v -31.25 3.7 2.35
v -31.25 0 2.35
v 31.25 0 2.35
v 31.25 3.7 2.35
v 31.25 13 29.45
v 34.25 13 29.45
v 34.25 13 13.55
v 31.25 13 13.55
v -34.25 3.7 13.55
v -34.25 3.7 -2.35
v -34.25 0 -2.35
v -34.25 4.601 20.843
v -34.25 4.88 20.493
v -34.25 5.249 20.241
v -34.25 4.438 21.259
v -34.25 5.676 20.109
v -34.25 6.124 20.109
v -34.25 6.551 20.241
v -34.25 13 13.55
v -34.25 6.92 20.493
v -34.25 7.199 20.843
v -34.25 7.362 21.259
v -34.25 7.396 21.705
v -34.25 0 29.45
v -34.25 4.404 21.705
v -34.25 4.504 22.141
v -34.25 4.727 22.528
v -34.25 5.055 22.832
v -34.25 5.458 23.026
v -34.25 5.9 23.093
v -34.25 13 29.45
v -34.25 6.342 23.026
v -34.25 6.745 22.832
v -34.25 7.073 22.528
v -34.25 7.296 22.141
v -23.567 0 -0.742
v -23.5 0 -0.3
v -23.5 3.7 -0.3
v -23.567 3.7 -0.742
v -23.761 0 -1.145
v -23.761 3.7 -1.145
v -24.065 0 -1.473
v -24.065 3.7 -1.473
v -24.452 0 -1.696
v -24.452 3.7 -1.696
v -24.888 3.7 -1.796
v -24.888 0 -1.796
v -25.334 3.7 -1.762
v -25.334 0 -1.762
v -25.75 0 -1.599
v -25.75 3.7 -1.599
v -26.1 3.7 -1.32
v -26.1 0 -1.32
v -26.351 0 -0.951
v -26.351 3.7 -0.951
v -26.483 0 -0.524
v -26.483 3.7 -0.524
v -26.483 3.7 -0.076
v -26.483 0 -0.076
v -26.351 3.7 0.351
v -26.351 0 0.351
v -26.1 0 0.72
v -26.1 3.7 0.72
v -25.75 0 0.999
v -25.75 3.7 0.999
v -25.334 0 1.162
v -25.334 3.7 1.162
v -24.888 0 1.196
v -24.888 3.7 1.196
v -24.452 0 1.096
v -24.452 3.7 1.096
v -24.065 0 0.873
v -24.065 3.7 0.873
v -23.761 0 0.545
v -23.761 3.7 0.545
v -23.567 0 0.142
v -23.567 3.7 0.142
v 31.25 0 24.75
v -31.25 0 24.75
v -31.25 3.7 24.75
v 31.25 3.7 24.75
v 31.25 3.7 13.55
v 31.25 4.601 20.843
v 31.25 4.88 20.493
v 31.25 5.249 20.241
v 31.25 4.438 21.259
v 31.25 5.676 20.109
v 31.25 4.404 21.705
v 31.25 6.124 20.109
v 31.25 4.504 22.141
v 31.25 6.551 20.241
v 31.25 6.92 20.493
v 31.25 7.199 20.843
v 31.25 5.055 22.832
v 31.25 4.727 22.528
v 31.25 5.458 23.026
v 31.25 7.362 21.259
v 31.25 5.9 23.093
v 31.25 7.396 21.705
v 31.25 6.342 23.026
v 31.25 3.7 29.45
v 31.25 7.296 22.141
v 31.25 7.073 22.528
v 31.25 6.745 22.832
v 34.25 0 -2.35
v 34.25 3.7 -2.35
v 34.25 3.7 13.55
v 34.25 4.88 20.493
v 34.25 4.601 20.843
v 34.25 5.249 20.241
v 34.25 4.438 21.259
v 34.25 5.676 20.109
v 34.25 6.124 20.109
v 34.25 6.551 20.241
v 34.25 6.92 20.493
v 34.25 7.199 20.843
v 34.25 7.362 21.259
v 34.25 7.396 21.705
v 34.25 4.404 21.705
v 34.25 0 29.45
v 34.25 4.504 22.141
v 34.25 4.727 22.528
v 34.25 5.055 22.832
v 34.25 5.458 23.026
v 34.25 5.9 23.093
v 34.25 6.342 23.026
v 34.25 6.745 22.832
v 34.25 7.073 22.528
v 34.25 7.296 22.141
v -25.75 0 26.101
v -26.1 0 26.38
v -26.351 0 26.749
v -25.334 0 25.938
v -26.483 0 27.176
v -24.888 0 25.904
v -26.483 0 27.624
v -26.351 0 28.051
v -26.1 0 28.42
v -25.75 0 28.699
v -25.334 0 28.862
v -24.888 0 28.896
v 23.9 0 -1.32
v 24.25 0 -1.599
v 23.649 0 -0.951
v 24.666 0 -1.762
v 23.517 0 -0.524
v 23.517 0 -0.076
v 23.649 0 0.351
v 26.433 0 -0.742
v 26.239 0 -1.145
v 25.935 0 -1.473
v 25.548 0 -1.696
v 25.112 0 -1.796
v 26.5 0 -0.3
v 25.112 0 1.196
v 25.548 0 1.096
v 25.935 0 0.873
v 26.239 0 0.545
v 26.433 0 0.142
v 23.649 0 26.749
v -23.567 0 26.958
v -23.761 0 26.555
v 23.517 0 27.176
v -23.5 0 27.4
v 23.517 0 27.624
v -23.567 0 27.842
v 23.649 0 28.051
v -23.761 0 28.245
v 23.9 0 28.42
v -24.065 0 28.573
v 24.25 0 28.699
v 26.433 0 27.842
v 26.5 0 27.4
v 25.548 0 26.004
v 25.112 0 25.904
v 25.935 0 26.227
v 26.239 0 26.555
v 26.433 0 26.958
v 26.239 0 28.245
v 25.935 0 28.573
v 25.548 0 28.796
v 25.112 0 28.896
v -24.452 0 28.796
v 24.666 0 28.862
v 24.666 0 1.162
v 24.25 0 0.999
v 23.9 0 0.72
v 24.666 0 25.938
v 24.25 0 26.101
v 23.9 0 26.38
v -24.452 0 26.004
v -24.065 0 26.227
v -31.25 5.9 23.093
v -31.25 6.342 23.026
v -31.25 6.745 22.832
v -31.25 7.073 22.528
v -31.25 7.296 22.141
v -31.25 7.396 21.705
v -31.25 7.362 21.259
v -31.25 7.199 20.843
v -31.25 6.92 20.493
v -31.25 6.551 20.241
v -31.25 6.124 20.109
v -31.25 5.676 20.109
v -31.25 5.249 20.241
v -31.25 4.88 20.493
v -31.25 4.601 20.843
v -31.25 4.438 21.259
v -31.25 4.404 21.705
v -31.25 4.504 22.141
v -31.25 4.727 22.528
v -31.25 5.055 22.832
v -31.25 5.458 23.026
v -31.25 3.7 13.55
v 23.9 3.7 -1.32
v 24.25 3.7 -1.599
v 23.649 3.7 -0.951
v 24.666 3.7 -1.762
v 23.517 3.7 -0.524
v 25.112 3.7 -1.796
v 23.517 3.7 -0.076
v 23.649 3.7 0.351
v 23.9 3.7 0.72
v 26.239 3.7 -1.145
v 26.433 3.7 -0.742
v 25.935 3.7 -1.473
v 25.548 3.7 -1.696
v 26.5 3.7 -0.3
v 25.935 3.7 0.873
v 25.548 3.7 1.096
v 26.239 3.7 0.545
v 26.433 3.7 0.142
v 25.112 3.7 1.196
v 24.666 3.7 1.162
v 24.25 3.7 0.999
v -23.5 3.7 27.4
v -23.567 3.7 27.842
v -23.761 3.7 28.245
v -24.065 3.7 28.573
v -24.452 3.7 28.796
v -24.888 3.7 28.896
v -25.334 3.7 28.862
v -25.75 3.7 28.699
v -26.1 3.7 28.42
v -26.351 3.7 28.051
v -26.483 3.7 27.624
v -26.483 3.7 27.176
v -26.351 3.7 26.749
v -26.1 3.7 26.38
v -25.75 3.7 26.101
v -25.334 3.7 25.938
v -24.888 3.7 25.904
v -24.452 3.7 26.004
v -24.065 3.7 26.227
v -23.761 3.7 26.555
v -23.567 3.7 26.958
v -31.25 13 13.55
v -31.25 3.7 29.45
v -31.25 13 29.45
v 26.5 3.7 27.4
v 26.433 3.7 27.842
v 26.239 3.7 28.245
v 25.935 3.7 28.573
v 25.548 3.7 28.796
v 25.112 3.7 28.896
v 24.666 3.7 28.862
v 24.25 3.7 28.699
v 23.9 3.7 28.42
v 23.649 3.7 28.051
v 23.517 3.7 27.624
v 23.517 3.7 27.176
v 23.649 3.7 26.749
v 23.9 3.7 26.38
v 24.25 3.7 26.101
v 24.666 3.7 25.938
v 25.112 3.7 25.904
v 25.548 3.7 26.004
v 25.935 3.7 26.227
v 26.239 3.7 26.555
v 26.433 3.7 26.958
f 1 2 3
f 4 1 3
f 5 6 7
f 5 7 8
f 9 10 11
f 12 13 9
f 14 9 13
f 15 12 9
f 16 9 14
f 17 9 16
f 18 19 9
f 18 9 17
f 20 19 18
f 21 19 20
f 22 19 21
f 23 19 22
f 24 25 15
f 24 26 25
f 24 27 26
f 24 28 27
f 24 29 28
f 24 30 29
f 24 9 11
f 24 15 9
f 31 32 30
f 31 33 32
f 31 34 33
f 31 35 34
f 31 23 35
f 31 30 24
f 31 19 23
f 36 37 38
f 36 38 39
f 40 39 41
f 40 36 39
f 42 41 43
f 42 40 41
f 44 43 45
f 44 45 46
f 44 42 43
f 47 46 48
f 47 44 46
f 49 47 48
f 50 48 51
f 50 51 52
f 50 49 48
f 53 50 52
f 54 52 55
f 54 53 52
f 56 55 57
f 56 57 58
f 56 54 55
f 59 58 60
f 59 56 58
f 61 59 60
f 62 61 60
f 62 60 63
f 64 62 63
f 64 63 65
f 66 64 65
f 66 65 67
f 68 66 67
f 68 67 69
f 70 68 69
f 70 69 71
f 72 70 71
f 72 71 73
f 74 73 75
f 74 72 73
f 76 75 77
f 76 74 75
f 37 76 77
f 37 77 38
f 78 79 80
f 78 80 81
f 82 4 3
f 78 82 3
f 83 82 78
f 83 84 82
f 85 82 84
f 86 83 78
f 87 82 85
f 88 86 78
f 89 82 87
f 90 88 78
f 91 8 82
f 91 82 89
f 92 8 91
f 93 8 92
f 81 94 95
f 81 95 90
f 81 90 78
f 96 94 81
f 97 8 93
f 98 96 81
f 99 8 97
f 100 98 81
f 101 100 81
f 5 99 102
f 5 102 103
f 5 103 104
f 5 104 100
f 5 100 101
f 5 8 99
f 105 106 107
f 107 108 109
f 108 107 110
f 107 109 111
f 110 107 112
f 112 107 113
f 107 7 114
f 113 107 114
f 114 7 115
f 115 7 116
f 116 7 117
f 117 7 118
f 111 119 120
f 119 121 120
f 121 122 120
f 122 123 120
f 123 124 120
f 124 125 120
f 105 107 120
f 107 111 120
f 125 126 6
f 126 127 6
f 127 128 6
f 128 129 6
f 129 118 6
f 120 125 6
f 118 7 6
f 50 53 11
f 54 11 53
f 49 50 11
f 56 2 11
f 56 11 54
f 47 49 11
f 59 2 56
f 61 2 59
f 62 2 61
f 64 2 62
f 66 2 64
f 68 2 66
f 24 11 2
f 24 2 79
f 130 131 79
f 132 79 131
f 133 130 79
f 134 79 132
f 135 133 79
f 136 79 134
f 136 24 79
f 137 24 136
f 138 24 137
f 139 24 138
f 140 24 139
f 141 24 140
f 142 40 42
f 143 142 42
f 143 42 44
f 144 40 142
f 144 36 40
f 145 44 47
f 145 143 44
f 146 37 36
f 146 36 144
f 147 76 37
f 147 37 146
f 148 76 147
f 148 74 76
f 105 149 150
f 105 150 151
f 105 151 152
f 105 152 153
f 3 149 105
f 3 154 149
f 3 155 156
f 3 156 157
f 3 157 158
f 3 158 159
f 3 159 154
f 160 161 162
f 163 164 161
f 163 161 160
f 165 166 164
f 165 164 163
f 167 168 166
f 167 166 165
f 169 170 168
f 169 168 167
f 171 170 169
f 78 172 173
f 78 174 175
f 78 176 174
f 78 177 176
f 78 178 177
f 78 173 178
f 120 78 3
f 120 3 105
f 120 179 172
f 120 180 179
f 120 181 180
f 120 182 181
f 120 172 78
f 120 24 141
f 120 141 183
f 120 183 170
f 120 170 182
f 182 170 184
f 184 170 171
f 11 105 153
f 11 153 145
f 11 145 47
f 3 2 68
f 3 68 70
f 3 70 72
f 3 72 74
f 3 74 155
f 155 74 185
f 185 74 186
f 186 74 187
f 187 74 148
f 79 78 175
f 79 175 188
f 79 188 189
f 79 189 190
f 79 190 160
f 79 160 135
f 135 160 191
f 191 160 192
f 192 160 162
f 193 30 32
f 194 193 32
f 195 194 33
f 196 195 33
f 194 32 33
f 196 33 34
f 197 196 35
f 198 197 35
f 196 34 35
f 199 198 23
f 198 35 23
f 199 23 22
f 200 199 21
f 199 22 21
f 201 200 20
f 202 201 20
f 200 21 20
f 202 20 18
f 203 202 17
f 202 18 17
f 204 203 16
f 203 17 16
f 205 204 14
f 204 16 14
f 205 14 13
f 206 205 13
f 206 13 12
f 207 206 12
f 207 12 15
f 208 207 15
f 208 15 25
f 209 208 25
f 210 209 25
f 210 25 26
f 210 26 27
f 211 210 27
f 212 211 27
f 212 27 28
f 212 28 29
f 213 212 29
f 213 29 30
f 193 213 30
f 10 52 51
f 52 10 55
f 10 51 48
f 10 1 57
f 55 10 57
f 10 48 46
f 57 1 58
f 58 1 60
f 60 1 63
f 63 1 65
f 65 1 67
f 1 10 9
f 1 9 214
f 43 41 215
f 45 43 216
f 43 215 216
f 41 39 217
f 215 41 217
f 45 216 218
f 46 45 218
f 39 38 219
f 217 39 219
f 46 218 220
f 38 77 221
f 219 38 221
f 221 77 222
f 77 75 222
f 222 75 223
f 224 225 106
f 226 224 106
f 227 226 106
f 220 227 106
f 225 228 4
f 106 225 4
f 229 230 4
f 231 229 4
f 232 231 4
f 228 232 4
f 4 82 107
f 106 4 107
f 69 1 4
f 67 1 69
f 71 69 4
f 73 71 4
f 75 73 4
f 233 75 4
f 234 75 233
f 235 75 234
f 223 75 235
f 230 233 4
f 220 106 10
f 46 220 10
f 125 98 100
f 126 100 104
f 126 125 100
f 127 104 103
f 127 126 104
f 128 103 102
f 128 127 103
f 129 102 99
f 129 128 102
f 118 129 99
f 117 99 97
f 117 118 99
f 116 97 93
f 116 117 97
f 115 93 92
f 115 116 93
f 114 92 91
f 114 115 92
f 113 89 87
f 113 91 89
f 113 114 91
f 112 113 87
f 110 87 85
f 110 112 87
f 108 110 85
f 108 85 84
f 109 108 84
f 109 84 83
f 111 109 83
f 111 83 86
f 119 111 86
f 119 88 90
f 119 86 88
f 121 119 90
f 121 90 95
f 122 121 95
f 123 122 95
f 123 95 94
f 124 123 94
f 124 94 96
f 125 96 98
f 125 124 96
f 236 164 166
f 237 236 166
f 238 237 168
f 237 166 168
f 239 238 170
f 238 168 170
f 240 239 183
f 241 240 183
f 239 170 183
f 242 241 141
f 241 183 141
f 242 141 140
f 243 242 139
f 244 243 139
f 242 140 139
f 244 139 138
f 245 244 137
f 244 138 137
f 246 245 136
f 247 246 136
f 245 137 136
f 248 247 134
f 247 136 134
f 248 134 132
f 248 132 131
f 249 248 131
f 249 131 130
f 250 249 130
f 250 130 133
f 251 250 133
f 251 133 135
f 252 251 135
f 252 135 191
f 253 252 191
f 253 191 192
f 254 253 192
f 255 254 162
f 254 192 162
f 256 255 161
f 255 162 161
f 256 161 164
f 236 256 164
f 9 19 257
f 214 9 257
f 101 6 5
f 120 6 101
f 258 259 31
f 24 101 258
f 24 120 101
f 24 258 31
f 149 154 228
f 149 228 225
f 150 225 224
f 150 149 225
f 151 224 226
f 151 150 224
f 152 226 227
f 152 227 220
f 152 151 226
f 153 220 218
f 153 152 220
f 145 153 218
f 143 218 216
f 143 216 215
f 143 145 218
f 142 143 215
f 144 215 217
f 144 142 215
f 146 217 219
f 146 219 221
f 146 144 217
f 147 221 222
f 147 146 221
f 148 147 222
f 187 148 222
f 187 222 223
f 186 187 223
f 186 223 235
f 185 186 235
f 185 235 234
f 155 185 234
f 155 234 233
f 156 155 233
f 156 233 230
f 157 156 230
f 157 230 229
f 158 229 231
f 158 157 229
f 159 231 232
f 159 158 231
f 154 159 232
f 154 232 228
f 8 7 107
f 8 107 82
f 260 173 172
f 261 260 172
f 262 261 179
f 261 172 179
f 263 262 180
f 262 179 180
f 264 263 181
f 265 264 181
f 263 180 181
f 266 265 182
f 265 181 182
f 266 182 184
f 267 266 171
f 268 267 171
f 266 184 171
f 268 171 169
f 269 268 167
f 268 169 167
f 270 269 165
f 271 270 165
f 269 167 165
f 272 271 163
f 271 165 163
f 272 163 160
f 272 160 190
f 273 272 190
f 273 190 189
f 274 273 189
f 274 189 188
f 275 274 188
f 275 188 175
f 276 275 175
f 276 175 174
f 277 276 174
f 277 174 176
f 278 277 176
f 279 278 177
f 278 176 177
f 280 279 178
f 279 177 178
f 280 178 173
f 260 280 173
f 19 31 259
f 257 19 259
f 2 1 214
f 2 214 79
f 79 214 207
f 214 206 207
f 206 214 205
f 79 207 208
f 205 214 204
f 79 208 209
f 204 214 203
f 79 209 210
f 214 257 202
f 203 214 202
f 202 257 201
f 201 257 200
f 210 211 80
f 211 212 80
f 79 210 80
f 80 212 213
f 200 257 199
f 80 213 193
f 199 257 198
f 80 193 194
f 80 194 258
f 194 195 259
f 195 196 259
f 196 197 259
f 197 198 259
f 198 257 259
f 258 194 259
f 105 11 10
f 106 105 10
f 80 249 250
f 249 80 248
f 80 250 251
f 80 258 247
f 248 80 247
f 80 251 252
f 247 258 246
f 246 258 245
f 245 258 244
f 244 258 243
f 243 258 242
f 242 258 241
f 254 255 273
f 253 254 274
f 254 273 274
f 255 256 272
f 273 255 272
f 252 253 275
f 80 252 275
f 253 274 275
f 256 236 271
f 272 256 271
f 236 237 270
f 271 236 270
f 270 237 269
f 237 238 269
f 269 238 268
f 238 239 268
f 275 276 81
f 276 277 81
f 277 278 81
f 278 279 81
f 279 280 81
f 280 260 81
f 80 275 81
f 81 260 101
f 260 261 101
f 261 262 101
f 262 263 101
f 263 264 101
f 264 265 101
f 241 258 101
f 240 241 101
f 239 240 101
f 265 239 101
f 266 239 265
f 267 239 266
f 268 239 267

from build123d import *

# Parameters (mm, degrees)
SKETCH_1_W          = 62.5
SKETCH_1_H          = 4.7
SKETCH_1_R          = 1.5
EXTRUDE_1_DEPTH     = 3.7
SKETCH_2_W          = 31.8
SKETCH_2_H          = 3.7
EXTRUDE_2_DEPTH     = 3
SKETCH_3_W          = 3
SKETCH_3_H          = 15.9
EXTRUDE_3_DEPTH     = 13
SKETCH_4_R          = 1.5
CUT_EXTRUDE_1_DEPTH = 13


with BuildPart() as part:
    # 草图1 → 凸台-拉伸1 (new body)
    with BuildSketch(Plane(origin=(0, 0, 0), x_dir=(1, 0, 0), z_dir=(0, 1, 0))):
        Rectangle(SKETCH_1_W, SKETCH_1_H)
        with Locations((25, 0.3)):
            Circle(SKETCH_1_R, mode=Mode.SUBTRACT)
        with Locations((-25, 0.3)):
            Circle(SKETCH_1_R, mode=Mode.SUBTRACT)
    extrude_1 = extrude(amount=EXTRUDE_1_DEPTH)

    # 草图2 → 凸台-拉伸2 (add)
    with BuildSketch(Plane.ZY.offset(31.25)):
        with Locations((13.55, 1.85)):
            Rectangle(SKETCH_2_W, SKETCH_2_H)
    extrude_2 = extrude(amount=EXTRUDE_2_DEPTH)

    # 镜向1: 凸台-拉伸2 across plane
    add(extrude_2.mirror(Plane(origin=(0, 0, 0), x_dir=(0, 0, 1), z_dir=(1, 0, 0))))

    # 镜向2: 凸台-拉伸1 across plane
    add(extrude_1.mirror(Plane.XY.offset(13.55)))

    # 草图3 → 凸台-拉伸3 (add)
    with BuildSketch(Plane.XZ):
        with Locations((-32.75, 21.5)):
            Rectangle(SKETCH_3_W, SKETCH_3_H)
    extrude_3 = extrude(amount=-EXTRUDE_3_DEPTH)

    # 草图4 → 切除-拉伸1 (cut)
    with BuildSketch(Plane.ZY.offset(34.25)):
        with Locations((21.592743177, 5.9)):
            Circle(SKETCH_4_R)
    cut_extrude_1 = extrude(amount=-CUT_EXTRUDE_1_DEPTH, mode=Mode.SUBTRACT)

    # 镜向3: 凸台-拉伸3, 切除-拉伸1 across plane
    add(extrude_3.mirror(Plane(origin=(0, 0, 0), x_dir=(0, 0, 1), z_dir=(1, 0, 0))))
    add(cut_extrude_1.mirror(Plane(origin=(0, 0, 0), x_dir=(0, 0, 1), z_dir=(1, 0, 0))), mode=Mode.SUBTRACT)


solid = part.part
